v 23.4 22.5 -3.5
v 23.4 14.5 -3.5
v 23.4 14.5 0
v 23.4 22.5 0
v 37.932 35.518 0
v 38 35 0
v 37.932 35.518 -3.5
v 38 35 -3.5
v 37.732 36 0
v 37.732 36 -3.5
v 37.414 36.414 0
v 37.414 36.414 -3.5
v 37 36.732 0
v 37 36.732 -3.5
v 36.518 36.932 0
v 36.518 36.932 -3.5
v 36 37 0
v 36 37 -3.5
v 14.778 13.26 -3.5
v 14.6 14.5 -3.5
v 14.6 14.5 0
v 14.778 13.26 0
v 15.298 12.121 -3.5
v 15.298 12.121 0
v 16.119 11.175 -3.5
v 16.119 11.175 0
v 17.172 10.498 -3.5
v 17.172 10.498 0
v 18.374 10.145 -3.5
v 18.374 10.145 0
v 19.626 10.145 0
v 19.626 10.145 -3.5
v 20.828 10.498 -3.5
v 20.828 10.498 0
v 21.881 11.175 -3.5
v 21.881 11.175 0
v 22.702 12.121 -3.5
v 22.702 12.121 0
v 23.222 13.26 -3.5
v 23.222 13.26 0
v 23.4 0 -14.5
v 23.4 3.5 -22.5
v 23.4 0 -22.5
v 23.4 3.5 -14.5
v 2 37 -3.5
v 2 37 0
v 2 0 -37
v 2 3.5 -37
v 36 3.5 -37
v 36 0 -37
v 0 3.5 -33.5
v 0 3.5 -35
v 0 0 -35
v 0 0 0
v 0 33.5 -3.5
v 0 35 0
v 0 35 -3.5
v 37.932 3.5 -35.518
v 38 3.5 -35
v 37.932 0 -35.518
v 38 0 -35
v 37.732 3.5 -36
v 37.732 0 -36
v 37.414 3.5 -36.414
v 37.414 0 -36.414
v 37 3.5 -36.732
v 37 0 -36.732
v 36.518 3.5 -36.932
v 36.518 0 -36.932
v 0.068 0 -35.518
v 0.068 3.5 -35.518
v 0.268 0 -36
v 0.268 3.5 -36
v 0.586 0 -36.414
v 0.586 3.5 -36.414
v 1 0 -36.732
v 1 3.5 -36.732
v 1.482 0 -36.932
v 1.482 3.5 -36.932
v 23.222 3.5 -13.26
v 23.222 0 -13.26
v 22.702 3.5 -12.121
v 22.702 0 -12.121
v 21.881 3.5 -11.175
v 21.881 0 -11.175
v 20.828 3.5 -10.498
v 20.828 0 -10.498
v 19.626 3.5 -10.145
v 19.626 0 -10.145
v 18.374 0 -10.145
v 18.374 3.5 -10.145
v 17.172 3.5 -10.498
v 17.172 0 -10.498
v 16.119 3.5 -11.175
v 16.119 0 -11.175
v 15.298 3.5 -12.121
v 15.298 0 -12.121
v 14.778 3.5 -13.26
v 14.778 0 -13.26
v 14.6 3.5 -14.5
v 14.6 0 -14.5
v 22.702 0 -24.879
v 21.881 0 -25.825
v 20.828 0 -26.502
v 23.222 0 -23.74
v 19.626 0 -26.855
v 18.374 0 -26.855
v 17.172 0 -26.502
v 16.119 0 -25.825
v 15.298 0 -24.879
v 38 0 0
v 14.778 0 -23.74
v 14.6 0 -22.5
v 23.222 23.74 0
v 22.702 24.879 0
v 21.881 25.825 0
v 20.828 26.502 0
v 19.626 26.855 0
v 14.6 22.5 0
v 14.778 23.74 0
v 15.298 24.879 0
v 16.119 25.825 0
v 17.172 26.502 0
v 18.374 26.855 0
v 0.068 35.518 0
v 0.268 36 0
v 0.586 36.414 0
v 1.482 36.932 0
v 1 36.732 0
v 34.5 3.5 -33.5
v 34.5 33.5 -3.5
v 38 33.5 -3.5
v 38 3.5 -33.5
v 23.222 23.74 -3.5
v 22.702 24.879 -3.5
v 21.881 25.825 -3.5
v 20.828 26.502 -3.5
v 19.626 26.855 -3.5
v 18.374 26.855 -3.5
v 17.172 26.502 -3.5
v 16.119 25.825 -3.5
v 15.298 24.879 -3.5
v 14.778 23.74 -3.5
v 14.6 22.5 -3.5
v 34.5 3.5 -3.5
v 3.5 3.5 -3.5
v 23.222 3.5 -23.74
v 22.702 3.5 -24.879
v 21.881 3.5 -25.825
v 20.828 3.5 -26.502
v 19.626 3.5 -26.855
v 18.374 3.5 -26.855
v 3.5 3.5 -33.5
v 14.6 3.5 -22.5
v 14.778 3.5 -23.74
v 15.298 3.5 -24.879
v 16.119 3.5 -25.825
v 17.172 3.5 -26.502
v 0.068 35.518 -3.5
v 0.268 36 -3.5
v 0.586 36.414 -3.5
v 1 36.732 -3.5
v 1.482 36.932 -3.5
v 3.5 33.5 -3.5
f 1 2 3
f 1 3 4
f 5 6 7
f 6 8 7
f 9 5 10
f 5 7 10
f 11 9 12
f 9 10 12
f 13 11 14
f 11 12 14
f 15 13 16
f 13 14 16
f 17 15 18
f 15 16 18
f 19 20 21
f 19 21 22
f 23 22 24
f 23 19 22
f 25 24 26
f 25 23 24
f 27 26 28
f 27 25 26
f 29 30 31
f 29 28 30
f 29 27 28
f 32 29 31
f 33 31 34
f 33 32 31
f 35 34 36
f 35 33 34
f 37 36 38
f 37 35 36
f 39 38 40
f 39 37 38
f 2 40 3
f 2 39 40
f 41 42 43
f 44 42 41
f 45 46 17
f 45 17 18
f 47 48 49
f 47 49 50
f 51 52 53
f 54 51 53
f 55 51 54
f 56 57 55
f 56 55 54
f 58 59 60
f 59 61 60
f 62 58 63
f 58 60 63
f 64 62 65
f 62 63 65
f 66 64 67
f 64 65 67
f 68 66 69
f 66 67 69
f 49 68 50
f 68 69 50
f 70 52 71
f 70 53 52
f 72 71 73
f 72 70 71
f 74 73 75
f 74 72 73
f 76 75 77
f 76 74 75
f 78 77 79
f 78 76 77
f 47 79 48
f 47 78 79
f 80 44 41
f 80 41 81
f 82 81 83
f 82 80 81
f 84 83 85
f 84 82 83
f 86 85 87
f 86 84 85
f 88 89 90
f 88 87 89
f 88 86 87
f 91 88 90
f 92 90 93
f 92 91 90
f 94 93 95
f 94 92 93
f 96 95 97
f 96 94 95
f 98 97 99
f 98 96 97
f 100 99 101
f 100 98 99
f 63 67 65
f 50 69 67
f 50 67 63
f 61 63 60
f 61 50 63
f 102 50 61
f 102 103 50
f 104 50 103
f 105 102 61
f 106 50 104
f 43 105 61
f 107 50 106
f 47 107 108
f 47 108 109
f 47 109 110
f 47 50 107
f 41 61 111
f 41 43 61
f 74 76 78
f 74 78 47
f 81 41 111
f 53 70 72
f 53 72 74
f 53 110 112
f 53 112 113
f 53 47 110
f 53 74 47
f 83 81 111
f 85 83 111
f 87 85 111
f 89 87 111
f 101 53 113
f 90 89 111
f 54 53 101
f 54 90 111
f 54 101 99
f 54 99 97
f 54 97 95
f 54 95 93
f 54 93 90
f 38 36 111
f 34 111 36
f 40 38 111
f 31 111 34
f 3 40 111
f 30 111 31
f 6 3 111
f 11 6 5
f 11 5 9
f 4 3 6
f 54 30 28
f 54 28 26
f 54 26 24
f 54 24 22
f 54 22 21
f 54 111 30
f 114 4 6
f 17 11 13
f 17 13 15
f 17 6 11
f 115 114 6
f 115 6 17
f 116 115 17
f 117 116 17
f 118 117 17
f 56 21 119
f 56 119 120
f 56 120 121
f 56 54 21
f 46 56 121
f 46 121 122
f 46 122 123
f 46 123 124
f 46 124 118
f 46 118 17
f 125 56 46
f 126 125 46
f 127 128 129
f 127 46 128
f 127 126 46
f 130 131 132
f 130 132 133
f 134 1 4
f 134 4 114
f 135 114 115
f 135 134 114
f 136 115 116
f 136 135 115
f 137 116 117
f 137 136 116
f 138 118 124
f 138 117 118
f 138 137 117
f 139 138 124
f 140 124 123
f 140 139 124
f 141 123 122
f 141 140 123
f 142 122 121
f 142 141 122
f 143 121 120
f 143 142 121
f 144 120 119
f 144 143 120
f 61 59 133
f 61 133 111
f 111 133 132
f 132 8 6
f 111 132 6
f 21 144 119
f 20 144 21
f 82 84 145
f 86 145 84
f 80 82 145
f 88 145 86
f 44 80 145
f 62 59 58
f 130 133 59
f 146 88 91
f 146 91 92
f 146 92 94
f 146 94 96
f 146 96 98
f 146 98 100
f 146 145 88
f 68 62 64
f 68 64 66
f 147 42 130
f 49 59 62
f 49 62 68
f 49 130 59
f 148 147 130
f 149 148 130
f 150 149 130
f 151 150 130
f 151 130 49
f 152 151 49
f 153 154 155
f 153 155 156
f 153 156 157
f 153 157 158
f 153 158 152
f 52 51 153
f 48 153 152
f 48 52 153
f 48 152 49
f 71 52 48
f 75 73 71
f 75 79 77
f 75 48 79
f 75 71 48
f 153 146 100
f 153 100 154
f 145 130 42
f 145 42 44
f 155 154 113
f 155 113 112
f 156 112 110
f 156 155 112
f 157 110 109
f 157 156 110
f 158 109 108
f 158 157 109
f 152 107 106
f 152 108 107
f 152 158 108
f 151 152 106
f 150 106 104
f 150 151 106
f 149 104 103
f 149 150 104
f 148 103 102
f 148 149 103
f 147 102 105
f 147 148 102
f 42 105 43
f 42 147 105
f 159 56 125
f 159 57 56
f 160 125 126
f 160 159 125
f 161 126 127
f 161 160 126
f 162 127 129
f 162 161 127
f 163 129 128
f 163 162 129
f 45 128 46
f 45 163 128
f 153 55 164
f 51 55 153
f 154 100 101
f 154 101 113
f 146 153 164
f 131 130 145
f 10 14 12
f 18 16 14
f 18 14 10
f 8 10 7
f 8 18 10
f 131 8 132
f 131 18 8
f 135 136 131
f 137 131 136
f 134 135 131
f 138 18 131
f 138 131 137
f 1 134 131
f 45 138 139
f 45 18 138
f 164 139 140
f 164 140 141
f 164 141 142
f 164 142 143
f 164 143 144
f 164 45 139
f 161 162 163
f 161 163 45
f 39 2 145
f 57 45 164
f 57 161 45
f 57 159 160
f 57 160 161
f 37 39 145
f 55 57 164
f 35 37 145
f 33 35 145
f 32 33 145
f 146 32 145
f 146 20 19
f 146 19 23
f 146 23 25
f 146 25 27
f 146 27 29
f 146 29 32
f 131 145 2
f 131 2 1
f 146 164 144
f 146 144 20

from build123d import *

# Parameters (mm, degrees)
Y_KSEKLIK_EKSTR_ZYON1_DEPTH = 38
IZIM2_W                     = 31
IZIM2_H                     = 30
KES_EKSTR_ZYON1_DEPTH       = 33.5
KES_EKSTR_ZYON2_DEPTH       = 38
KES_EKSTR_ZYON3_DEPTH       = 38
RADYUS2_R                   = 2


with BuildPart() as part:
    # Çizim1 → Yükseklik-Ekstrüzyon1 (new body)
    with BuildSketch(Plane(origin=(0, 0, 0), x_dir=(0, 0, -1), z_dir=(1, 0, 0))):
        Polygon((0, 0), (0, 37), (3.5, 37), (3.5, 33.5), (33.5, 3.5), (37, 3.5), (37, 0), align=None)
    extrude(amount=Y_KSEKLIK_EKSTR_ZYON1_DEPTH)

    # Çizim2 → Kes-Ekstrüzyon1 (cut)
    with BuildSketch(Plane(origin=(0, 0, -37), x_dir=(-1, 0, 0), z_dir=(0, 0, -1))):
        with Locations((-19, 18.5)):
            Rectangle(IZIM2_W, IZIM2_H)
    extrude(amount=-KES_EKSTR_ZYON1_DEPTH, mode=Mode.SUBTRACT)

    # Çizim3 → Kes-Ekstrüzyon2 (cut)
    with BuildSketch(Plane(origin=(0, 0, -3.5), x_dir=(-1, 0, 0), z_dir=(0, 0, -1))):
        with BuildLine():
            Line((-14.6, 22.5), (-14.6, 14.5))
            ThreePointArc((-14.6, 14.5), (-19, 10.1), (-23.4, 14.5))
            Line((-23.4, 14.5), (-23.4, 22.5))
            ThreePointArc((-23.4, 22.5), (-19, 26.9), (-14.6, 22.5))
        make_face()
    extrude(amount=-KES_EKSTR_ZYON2_DEPTH, mode=Mode.SUBTRACT)

    # Çizim4 → Kes-Ekstrüzyon3 (cut)
    with BuildSketch(Plane(origin=(0, 3.5, 0), x_dir=(1, 0, 0), z_dir=(0, 1, 0))):
        with BuildLine():
            Line((23.4, 22.5), (23.4, 14.5))
            ThreePointArc((23.4, 14.5), (19, 10.1), (14.6, 14.5))
            Line((14.6, 14.5), (14.6, 22.5))
            ThreePointArc((14.6, 22.5), (19, 26.9), (23.4, 22.5))
        make_face()
    extrude(amount=-KES_EKSTR_ZYON3_DEPTH, mode=Mode.SUBTRACT)

    # Radyus2
    radyus2_edges = [part.edges().sort_by_distance(p)[0] for p in [
        (38, 37, -1.75),
        (38, 1.75, -37),
        (0, 37, -1.75),
        (0, 1.75, -37),
    ]]
    fillet(radyus2_edges, radius=RADYUS2_R)


solid = part.part
